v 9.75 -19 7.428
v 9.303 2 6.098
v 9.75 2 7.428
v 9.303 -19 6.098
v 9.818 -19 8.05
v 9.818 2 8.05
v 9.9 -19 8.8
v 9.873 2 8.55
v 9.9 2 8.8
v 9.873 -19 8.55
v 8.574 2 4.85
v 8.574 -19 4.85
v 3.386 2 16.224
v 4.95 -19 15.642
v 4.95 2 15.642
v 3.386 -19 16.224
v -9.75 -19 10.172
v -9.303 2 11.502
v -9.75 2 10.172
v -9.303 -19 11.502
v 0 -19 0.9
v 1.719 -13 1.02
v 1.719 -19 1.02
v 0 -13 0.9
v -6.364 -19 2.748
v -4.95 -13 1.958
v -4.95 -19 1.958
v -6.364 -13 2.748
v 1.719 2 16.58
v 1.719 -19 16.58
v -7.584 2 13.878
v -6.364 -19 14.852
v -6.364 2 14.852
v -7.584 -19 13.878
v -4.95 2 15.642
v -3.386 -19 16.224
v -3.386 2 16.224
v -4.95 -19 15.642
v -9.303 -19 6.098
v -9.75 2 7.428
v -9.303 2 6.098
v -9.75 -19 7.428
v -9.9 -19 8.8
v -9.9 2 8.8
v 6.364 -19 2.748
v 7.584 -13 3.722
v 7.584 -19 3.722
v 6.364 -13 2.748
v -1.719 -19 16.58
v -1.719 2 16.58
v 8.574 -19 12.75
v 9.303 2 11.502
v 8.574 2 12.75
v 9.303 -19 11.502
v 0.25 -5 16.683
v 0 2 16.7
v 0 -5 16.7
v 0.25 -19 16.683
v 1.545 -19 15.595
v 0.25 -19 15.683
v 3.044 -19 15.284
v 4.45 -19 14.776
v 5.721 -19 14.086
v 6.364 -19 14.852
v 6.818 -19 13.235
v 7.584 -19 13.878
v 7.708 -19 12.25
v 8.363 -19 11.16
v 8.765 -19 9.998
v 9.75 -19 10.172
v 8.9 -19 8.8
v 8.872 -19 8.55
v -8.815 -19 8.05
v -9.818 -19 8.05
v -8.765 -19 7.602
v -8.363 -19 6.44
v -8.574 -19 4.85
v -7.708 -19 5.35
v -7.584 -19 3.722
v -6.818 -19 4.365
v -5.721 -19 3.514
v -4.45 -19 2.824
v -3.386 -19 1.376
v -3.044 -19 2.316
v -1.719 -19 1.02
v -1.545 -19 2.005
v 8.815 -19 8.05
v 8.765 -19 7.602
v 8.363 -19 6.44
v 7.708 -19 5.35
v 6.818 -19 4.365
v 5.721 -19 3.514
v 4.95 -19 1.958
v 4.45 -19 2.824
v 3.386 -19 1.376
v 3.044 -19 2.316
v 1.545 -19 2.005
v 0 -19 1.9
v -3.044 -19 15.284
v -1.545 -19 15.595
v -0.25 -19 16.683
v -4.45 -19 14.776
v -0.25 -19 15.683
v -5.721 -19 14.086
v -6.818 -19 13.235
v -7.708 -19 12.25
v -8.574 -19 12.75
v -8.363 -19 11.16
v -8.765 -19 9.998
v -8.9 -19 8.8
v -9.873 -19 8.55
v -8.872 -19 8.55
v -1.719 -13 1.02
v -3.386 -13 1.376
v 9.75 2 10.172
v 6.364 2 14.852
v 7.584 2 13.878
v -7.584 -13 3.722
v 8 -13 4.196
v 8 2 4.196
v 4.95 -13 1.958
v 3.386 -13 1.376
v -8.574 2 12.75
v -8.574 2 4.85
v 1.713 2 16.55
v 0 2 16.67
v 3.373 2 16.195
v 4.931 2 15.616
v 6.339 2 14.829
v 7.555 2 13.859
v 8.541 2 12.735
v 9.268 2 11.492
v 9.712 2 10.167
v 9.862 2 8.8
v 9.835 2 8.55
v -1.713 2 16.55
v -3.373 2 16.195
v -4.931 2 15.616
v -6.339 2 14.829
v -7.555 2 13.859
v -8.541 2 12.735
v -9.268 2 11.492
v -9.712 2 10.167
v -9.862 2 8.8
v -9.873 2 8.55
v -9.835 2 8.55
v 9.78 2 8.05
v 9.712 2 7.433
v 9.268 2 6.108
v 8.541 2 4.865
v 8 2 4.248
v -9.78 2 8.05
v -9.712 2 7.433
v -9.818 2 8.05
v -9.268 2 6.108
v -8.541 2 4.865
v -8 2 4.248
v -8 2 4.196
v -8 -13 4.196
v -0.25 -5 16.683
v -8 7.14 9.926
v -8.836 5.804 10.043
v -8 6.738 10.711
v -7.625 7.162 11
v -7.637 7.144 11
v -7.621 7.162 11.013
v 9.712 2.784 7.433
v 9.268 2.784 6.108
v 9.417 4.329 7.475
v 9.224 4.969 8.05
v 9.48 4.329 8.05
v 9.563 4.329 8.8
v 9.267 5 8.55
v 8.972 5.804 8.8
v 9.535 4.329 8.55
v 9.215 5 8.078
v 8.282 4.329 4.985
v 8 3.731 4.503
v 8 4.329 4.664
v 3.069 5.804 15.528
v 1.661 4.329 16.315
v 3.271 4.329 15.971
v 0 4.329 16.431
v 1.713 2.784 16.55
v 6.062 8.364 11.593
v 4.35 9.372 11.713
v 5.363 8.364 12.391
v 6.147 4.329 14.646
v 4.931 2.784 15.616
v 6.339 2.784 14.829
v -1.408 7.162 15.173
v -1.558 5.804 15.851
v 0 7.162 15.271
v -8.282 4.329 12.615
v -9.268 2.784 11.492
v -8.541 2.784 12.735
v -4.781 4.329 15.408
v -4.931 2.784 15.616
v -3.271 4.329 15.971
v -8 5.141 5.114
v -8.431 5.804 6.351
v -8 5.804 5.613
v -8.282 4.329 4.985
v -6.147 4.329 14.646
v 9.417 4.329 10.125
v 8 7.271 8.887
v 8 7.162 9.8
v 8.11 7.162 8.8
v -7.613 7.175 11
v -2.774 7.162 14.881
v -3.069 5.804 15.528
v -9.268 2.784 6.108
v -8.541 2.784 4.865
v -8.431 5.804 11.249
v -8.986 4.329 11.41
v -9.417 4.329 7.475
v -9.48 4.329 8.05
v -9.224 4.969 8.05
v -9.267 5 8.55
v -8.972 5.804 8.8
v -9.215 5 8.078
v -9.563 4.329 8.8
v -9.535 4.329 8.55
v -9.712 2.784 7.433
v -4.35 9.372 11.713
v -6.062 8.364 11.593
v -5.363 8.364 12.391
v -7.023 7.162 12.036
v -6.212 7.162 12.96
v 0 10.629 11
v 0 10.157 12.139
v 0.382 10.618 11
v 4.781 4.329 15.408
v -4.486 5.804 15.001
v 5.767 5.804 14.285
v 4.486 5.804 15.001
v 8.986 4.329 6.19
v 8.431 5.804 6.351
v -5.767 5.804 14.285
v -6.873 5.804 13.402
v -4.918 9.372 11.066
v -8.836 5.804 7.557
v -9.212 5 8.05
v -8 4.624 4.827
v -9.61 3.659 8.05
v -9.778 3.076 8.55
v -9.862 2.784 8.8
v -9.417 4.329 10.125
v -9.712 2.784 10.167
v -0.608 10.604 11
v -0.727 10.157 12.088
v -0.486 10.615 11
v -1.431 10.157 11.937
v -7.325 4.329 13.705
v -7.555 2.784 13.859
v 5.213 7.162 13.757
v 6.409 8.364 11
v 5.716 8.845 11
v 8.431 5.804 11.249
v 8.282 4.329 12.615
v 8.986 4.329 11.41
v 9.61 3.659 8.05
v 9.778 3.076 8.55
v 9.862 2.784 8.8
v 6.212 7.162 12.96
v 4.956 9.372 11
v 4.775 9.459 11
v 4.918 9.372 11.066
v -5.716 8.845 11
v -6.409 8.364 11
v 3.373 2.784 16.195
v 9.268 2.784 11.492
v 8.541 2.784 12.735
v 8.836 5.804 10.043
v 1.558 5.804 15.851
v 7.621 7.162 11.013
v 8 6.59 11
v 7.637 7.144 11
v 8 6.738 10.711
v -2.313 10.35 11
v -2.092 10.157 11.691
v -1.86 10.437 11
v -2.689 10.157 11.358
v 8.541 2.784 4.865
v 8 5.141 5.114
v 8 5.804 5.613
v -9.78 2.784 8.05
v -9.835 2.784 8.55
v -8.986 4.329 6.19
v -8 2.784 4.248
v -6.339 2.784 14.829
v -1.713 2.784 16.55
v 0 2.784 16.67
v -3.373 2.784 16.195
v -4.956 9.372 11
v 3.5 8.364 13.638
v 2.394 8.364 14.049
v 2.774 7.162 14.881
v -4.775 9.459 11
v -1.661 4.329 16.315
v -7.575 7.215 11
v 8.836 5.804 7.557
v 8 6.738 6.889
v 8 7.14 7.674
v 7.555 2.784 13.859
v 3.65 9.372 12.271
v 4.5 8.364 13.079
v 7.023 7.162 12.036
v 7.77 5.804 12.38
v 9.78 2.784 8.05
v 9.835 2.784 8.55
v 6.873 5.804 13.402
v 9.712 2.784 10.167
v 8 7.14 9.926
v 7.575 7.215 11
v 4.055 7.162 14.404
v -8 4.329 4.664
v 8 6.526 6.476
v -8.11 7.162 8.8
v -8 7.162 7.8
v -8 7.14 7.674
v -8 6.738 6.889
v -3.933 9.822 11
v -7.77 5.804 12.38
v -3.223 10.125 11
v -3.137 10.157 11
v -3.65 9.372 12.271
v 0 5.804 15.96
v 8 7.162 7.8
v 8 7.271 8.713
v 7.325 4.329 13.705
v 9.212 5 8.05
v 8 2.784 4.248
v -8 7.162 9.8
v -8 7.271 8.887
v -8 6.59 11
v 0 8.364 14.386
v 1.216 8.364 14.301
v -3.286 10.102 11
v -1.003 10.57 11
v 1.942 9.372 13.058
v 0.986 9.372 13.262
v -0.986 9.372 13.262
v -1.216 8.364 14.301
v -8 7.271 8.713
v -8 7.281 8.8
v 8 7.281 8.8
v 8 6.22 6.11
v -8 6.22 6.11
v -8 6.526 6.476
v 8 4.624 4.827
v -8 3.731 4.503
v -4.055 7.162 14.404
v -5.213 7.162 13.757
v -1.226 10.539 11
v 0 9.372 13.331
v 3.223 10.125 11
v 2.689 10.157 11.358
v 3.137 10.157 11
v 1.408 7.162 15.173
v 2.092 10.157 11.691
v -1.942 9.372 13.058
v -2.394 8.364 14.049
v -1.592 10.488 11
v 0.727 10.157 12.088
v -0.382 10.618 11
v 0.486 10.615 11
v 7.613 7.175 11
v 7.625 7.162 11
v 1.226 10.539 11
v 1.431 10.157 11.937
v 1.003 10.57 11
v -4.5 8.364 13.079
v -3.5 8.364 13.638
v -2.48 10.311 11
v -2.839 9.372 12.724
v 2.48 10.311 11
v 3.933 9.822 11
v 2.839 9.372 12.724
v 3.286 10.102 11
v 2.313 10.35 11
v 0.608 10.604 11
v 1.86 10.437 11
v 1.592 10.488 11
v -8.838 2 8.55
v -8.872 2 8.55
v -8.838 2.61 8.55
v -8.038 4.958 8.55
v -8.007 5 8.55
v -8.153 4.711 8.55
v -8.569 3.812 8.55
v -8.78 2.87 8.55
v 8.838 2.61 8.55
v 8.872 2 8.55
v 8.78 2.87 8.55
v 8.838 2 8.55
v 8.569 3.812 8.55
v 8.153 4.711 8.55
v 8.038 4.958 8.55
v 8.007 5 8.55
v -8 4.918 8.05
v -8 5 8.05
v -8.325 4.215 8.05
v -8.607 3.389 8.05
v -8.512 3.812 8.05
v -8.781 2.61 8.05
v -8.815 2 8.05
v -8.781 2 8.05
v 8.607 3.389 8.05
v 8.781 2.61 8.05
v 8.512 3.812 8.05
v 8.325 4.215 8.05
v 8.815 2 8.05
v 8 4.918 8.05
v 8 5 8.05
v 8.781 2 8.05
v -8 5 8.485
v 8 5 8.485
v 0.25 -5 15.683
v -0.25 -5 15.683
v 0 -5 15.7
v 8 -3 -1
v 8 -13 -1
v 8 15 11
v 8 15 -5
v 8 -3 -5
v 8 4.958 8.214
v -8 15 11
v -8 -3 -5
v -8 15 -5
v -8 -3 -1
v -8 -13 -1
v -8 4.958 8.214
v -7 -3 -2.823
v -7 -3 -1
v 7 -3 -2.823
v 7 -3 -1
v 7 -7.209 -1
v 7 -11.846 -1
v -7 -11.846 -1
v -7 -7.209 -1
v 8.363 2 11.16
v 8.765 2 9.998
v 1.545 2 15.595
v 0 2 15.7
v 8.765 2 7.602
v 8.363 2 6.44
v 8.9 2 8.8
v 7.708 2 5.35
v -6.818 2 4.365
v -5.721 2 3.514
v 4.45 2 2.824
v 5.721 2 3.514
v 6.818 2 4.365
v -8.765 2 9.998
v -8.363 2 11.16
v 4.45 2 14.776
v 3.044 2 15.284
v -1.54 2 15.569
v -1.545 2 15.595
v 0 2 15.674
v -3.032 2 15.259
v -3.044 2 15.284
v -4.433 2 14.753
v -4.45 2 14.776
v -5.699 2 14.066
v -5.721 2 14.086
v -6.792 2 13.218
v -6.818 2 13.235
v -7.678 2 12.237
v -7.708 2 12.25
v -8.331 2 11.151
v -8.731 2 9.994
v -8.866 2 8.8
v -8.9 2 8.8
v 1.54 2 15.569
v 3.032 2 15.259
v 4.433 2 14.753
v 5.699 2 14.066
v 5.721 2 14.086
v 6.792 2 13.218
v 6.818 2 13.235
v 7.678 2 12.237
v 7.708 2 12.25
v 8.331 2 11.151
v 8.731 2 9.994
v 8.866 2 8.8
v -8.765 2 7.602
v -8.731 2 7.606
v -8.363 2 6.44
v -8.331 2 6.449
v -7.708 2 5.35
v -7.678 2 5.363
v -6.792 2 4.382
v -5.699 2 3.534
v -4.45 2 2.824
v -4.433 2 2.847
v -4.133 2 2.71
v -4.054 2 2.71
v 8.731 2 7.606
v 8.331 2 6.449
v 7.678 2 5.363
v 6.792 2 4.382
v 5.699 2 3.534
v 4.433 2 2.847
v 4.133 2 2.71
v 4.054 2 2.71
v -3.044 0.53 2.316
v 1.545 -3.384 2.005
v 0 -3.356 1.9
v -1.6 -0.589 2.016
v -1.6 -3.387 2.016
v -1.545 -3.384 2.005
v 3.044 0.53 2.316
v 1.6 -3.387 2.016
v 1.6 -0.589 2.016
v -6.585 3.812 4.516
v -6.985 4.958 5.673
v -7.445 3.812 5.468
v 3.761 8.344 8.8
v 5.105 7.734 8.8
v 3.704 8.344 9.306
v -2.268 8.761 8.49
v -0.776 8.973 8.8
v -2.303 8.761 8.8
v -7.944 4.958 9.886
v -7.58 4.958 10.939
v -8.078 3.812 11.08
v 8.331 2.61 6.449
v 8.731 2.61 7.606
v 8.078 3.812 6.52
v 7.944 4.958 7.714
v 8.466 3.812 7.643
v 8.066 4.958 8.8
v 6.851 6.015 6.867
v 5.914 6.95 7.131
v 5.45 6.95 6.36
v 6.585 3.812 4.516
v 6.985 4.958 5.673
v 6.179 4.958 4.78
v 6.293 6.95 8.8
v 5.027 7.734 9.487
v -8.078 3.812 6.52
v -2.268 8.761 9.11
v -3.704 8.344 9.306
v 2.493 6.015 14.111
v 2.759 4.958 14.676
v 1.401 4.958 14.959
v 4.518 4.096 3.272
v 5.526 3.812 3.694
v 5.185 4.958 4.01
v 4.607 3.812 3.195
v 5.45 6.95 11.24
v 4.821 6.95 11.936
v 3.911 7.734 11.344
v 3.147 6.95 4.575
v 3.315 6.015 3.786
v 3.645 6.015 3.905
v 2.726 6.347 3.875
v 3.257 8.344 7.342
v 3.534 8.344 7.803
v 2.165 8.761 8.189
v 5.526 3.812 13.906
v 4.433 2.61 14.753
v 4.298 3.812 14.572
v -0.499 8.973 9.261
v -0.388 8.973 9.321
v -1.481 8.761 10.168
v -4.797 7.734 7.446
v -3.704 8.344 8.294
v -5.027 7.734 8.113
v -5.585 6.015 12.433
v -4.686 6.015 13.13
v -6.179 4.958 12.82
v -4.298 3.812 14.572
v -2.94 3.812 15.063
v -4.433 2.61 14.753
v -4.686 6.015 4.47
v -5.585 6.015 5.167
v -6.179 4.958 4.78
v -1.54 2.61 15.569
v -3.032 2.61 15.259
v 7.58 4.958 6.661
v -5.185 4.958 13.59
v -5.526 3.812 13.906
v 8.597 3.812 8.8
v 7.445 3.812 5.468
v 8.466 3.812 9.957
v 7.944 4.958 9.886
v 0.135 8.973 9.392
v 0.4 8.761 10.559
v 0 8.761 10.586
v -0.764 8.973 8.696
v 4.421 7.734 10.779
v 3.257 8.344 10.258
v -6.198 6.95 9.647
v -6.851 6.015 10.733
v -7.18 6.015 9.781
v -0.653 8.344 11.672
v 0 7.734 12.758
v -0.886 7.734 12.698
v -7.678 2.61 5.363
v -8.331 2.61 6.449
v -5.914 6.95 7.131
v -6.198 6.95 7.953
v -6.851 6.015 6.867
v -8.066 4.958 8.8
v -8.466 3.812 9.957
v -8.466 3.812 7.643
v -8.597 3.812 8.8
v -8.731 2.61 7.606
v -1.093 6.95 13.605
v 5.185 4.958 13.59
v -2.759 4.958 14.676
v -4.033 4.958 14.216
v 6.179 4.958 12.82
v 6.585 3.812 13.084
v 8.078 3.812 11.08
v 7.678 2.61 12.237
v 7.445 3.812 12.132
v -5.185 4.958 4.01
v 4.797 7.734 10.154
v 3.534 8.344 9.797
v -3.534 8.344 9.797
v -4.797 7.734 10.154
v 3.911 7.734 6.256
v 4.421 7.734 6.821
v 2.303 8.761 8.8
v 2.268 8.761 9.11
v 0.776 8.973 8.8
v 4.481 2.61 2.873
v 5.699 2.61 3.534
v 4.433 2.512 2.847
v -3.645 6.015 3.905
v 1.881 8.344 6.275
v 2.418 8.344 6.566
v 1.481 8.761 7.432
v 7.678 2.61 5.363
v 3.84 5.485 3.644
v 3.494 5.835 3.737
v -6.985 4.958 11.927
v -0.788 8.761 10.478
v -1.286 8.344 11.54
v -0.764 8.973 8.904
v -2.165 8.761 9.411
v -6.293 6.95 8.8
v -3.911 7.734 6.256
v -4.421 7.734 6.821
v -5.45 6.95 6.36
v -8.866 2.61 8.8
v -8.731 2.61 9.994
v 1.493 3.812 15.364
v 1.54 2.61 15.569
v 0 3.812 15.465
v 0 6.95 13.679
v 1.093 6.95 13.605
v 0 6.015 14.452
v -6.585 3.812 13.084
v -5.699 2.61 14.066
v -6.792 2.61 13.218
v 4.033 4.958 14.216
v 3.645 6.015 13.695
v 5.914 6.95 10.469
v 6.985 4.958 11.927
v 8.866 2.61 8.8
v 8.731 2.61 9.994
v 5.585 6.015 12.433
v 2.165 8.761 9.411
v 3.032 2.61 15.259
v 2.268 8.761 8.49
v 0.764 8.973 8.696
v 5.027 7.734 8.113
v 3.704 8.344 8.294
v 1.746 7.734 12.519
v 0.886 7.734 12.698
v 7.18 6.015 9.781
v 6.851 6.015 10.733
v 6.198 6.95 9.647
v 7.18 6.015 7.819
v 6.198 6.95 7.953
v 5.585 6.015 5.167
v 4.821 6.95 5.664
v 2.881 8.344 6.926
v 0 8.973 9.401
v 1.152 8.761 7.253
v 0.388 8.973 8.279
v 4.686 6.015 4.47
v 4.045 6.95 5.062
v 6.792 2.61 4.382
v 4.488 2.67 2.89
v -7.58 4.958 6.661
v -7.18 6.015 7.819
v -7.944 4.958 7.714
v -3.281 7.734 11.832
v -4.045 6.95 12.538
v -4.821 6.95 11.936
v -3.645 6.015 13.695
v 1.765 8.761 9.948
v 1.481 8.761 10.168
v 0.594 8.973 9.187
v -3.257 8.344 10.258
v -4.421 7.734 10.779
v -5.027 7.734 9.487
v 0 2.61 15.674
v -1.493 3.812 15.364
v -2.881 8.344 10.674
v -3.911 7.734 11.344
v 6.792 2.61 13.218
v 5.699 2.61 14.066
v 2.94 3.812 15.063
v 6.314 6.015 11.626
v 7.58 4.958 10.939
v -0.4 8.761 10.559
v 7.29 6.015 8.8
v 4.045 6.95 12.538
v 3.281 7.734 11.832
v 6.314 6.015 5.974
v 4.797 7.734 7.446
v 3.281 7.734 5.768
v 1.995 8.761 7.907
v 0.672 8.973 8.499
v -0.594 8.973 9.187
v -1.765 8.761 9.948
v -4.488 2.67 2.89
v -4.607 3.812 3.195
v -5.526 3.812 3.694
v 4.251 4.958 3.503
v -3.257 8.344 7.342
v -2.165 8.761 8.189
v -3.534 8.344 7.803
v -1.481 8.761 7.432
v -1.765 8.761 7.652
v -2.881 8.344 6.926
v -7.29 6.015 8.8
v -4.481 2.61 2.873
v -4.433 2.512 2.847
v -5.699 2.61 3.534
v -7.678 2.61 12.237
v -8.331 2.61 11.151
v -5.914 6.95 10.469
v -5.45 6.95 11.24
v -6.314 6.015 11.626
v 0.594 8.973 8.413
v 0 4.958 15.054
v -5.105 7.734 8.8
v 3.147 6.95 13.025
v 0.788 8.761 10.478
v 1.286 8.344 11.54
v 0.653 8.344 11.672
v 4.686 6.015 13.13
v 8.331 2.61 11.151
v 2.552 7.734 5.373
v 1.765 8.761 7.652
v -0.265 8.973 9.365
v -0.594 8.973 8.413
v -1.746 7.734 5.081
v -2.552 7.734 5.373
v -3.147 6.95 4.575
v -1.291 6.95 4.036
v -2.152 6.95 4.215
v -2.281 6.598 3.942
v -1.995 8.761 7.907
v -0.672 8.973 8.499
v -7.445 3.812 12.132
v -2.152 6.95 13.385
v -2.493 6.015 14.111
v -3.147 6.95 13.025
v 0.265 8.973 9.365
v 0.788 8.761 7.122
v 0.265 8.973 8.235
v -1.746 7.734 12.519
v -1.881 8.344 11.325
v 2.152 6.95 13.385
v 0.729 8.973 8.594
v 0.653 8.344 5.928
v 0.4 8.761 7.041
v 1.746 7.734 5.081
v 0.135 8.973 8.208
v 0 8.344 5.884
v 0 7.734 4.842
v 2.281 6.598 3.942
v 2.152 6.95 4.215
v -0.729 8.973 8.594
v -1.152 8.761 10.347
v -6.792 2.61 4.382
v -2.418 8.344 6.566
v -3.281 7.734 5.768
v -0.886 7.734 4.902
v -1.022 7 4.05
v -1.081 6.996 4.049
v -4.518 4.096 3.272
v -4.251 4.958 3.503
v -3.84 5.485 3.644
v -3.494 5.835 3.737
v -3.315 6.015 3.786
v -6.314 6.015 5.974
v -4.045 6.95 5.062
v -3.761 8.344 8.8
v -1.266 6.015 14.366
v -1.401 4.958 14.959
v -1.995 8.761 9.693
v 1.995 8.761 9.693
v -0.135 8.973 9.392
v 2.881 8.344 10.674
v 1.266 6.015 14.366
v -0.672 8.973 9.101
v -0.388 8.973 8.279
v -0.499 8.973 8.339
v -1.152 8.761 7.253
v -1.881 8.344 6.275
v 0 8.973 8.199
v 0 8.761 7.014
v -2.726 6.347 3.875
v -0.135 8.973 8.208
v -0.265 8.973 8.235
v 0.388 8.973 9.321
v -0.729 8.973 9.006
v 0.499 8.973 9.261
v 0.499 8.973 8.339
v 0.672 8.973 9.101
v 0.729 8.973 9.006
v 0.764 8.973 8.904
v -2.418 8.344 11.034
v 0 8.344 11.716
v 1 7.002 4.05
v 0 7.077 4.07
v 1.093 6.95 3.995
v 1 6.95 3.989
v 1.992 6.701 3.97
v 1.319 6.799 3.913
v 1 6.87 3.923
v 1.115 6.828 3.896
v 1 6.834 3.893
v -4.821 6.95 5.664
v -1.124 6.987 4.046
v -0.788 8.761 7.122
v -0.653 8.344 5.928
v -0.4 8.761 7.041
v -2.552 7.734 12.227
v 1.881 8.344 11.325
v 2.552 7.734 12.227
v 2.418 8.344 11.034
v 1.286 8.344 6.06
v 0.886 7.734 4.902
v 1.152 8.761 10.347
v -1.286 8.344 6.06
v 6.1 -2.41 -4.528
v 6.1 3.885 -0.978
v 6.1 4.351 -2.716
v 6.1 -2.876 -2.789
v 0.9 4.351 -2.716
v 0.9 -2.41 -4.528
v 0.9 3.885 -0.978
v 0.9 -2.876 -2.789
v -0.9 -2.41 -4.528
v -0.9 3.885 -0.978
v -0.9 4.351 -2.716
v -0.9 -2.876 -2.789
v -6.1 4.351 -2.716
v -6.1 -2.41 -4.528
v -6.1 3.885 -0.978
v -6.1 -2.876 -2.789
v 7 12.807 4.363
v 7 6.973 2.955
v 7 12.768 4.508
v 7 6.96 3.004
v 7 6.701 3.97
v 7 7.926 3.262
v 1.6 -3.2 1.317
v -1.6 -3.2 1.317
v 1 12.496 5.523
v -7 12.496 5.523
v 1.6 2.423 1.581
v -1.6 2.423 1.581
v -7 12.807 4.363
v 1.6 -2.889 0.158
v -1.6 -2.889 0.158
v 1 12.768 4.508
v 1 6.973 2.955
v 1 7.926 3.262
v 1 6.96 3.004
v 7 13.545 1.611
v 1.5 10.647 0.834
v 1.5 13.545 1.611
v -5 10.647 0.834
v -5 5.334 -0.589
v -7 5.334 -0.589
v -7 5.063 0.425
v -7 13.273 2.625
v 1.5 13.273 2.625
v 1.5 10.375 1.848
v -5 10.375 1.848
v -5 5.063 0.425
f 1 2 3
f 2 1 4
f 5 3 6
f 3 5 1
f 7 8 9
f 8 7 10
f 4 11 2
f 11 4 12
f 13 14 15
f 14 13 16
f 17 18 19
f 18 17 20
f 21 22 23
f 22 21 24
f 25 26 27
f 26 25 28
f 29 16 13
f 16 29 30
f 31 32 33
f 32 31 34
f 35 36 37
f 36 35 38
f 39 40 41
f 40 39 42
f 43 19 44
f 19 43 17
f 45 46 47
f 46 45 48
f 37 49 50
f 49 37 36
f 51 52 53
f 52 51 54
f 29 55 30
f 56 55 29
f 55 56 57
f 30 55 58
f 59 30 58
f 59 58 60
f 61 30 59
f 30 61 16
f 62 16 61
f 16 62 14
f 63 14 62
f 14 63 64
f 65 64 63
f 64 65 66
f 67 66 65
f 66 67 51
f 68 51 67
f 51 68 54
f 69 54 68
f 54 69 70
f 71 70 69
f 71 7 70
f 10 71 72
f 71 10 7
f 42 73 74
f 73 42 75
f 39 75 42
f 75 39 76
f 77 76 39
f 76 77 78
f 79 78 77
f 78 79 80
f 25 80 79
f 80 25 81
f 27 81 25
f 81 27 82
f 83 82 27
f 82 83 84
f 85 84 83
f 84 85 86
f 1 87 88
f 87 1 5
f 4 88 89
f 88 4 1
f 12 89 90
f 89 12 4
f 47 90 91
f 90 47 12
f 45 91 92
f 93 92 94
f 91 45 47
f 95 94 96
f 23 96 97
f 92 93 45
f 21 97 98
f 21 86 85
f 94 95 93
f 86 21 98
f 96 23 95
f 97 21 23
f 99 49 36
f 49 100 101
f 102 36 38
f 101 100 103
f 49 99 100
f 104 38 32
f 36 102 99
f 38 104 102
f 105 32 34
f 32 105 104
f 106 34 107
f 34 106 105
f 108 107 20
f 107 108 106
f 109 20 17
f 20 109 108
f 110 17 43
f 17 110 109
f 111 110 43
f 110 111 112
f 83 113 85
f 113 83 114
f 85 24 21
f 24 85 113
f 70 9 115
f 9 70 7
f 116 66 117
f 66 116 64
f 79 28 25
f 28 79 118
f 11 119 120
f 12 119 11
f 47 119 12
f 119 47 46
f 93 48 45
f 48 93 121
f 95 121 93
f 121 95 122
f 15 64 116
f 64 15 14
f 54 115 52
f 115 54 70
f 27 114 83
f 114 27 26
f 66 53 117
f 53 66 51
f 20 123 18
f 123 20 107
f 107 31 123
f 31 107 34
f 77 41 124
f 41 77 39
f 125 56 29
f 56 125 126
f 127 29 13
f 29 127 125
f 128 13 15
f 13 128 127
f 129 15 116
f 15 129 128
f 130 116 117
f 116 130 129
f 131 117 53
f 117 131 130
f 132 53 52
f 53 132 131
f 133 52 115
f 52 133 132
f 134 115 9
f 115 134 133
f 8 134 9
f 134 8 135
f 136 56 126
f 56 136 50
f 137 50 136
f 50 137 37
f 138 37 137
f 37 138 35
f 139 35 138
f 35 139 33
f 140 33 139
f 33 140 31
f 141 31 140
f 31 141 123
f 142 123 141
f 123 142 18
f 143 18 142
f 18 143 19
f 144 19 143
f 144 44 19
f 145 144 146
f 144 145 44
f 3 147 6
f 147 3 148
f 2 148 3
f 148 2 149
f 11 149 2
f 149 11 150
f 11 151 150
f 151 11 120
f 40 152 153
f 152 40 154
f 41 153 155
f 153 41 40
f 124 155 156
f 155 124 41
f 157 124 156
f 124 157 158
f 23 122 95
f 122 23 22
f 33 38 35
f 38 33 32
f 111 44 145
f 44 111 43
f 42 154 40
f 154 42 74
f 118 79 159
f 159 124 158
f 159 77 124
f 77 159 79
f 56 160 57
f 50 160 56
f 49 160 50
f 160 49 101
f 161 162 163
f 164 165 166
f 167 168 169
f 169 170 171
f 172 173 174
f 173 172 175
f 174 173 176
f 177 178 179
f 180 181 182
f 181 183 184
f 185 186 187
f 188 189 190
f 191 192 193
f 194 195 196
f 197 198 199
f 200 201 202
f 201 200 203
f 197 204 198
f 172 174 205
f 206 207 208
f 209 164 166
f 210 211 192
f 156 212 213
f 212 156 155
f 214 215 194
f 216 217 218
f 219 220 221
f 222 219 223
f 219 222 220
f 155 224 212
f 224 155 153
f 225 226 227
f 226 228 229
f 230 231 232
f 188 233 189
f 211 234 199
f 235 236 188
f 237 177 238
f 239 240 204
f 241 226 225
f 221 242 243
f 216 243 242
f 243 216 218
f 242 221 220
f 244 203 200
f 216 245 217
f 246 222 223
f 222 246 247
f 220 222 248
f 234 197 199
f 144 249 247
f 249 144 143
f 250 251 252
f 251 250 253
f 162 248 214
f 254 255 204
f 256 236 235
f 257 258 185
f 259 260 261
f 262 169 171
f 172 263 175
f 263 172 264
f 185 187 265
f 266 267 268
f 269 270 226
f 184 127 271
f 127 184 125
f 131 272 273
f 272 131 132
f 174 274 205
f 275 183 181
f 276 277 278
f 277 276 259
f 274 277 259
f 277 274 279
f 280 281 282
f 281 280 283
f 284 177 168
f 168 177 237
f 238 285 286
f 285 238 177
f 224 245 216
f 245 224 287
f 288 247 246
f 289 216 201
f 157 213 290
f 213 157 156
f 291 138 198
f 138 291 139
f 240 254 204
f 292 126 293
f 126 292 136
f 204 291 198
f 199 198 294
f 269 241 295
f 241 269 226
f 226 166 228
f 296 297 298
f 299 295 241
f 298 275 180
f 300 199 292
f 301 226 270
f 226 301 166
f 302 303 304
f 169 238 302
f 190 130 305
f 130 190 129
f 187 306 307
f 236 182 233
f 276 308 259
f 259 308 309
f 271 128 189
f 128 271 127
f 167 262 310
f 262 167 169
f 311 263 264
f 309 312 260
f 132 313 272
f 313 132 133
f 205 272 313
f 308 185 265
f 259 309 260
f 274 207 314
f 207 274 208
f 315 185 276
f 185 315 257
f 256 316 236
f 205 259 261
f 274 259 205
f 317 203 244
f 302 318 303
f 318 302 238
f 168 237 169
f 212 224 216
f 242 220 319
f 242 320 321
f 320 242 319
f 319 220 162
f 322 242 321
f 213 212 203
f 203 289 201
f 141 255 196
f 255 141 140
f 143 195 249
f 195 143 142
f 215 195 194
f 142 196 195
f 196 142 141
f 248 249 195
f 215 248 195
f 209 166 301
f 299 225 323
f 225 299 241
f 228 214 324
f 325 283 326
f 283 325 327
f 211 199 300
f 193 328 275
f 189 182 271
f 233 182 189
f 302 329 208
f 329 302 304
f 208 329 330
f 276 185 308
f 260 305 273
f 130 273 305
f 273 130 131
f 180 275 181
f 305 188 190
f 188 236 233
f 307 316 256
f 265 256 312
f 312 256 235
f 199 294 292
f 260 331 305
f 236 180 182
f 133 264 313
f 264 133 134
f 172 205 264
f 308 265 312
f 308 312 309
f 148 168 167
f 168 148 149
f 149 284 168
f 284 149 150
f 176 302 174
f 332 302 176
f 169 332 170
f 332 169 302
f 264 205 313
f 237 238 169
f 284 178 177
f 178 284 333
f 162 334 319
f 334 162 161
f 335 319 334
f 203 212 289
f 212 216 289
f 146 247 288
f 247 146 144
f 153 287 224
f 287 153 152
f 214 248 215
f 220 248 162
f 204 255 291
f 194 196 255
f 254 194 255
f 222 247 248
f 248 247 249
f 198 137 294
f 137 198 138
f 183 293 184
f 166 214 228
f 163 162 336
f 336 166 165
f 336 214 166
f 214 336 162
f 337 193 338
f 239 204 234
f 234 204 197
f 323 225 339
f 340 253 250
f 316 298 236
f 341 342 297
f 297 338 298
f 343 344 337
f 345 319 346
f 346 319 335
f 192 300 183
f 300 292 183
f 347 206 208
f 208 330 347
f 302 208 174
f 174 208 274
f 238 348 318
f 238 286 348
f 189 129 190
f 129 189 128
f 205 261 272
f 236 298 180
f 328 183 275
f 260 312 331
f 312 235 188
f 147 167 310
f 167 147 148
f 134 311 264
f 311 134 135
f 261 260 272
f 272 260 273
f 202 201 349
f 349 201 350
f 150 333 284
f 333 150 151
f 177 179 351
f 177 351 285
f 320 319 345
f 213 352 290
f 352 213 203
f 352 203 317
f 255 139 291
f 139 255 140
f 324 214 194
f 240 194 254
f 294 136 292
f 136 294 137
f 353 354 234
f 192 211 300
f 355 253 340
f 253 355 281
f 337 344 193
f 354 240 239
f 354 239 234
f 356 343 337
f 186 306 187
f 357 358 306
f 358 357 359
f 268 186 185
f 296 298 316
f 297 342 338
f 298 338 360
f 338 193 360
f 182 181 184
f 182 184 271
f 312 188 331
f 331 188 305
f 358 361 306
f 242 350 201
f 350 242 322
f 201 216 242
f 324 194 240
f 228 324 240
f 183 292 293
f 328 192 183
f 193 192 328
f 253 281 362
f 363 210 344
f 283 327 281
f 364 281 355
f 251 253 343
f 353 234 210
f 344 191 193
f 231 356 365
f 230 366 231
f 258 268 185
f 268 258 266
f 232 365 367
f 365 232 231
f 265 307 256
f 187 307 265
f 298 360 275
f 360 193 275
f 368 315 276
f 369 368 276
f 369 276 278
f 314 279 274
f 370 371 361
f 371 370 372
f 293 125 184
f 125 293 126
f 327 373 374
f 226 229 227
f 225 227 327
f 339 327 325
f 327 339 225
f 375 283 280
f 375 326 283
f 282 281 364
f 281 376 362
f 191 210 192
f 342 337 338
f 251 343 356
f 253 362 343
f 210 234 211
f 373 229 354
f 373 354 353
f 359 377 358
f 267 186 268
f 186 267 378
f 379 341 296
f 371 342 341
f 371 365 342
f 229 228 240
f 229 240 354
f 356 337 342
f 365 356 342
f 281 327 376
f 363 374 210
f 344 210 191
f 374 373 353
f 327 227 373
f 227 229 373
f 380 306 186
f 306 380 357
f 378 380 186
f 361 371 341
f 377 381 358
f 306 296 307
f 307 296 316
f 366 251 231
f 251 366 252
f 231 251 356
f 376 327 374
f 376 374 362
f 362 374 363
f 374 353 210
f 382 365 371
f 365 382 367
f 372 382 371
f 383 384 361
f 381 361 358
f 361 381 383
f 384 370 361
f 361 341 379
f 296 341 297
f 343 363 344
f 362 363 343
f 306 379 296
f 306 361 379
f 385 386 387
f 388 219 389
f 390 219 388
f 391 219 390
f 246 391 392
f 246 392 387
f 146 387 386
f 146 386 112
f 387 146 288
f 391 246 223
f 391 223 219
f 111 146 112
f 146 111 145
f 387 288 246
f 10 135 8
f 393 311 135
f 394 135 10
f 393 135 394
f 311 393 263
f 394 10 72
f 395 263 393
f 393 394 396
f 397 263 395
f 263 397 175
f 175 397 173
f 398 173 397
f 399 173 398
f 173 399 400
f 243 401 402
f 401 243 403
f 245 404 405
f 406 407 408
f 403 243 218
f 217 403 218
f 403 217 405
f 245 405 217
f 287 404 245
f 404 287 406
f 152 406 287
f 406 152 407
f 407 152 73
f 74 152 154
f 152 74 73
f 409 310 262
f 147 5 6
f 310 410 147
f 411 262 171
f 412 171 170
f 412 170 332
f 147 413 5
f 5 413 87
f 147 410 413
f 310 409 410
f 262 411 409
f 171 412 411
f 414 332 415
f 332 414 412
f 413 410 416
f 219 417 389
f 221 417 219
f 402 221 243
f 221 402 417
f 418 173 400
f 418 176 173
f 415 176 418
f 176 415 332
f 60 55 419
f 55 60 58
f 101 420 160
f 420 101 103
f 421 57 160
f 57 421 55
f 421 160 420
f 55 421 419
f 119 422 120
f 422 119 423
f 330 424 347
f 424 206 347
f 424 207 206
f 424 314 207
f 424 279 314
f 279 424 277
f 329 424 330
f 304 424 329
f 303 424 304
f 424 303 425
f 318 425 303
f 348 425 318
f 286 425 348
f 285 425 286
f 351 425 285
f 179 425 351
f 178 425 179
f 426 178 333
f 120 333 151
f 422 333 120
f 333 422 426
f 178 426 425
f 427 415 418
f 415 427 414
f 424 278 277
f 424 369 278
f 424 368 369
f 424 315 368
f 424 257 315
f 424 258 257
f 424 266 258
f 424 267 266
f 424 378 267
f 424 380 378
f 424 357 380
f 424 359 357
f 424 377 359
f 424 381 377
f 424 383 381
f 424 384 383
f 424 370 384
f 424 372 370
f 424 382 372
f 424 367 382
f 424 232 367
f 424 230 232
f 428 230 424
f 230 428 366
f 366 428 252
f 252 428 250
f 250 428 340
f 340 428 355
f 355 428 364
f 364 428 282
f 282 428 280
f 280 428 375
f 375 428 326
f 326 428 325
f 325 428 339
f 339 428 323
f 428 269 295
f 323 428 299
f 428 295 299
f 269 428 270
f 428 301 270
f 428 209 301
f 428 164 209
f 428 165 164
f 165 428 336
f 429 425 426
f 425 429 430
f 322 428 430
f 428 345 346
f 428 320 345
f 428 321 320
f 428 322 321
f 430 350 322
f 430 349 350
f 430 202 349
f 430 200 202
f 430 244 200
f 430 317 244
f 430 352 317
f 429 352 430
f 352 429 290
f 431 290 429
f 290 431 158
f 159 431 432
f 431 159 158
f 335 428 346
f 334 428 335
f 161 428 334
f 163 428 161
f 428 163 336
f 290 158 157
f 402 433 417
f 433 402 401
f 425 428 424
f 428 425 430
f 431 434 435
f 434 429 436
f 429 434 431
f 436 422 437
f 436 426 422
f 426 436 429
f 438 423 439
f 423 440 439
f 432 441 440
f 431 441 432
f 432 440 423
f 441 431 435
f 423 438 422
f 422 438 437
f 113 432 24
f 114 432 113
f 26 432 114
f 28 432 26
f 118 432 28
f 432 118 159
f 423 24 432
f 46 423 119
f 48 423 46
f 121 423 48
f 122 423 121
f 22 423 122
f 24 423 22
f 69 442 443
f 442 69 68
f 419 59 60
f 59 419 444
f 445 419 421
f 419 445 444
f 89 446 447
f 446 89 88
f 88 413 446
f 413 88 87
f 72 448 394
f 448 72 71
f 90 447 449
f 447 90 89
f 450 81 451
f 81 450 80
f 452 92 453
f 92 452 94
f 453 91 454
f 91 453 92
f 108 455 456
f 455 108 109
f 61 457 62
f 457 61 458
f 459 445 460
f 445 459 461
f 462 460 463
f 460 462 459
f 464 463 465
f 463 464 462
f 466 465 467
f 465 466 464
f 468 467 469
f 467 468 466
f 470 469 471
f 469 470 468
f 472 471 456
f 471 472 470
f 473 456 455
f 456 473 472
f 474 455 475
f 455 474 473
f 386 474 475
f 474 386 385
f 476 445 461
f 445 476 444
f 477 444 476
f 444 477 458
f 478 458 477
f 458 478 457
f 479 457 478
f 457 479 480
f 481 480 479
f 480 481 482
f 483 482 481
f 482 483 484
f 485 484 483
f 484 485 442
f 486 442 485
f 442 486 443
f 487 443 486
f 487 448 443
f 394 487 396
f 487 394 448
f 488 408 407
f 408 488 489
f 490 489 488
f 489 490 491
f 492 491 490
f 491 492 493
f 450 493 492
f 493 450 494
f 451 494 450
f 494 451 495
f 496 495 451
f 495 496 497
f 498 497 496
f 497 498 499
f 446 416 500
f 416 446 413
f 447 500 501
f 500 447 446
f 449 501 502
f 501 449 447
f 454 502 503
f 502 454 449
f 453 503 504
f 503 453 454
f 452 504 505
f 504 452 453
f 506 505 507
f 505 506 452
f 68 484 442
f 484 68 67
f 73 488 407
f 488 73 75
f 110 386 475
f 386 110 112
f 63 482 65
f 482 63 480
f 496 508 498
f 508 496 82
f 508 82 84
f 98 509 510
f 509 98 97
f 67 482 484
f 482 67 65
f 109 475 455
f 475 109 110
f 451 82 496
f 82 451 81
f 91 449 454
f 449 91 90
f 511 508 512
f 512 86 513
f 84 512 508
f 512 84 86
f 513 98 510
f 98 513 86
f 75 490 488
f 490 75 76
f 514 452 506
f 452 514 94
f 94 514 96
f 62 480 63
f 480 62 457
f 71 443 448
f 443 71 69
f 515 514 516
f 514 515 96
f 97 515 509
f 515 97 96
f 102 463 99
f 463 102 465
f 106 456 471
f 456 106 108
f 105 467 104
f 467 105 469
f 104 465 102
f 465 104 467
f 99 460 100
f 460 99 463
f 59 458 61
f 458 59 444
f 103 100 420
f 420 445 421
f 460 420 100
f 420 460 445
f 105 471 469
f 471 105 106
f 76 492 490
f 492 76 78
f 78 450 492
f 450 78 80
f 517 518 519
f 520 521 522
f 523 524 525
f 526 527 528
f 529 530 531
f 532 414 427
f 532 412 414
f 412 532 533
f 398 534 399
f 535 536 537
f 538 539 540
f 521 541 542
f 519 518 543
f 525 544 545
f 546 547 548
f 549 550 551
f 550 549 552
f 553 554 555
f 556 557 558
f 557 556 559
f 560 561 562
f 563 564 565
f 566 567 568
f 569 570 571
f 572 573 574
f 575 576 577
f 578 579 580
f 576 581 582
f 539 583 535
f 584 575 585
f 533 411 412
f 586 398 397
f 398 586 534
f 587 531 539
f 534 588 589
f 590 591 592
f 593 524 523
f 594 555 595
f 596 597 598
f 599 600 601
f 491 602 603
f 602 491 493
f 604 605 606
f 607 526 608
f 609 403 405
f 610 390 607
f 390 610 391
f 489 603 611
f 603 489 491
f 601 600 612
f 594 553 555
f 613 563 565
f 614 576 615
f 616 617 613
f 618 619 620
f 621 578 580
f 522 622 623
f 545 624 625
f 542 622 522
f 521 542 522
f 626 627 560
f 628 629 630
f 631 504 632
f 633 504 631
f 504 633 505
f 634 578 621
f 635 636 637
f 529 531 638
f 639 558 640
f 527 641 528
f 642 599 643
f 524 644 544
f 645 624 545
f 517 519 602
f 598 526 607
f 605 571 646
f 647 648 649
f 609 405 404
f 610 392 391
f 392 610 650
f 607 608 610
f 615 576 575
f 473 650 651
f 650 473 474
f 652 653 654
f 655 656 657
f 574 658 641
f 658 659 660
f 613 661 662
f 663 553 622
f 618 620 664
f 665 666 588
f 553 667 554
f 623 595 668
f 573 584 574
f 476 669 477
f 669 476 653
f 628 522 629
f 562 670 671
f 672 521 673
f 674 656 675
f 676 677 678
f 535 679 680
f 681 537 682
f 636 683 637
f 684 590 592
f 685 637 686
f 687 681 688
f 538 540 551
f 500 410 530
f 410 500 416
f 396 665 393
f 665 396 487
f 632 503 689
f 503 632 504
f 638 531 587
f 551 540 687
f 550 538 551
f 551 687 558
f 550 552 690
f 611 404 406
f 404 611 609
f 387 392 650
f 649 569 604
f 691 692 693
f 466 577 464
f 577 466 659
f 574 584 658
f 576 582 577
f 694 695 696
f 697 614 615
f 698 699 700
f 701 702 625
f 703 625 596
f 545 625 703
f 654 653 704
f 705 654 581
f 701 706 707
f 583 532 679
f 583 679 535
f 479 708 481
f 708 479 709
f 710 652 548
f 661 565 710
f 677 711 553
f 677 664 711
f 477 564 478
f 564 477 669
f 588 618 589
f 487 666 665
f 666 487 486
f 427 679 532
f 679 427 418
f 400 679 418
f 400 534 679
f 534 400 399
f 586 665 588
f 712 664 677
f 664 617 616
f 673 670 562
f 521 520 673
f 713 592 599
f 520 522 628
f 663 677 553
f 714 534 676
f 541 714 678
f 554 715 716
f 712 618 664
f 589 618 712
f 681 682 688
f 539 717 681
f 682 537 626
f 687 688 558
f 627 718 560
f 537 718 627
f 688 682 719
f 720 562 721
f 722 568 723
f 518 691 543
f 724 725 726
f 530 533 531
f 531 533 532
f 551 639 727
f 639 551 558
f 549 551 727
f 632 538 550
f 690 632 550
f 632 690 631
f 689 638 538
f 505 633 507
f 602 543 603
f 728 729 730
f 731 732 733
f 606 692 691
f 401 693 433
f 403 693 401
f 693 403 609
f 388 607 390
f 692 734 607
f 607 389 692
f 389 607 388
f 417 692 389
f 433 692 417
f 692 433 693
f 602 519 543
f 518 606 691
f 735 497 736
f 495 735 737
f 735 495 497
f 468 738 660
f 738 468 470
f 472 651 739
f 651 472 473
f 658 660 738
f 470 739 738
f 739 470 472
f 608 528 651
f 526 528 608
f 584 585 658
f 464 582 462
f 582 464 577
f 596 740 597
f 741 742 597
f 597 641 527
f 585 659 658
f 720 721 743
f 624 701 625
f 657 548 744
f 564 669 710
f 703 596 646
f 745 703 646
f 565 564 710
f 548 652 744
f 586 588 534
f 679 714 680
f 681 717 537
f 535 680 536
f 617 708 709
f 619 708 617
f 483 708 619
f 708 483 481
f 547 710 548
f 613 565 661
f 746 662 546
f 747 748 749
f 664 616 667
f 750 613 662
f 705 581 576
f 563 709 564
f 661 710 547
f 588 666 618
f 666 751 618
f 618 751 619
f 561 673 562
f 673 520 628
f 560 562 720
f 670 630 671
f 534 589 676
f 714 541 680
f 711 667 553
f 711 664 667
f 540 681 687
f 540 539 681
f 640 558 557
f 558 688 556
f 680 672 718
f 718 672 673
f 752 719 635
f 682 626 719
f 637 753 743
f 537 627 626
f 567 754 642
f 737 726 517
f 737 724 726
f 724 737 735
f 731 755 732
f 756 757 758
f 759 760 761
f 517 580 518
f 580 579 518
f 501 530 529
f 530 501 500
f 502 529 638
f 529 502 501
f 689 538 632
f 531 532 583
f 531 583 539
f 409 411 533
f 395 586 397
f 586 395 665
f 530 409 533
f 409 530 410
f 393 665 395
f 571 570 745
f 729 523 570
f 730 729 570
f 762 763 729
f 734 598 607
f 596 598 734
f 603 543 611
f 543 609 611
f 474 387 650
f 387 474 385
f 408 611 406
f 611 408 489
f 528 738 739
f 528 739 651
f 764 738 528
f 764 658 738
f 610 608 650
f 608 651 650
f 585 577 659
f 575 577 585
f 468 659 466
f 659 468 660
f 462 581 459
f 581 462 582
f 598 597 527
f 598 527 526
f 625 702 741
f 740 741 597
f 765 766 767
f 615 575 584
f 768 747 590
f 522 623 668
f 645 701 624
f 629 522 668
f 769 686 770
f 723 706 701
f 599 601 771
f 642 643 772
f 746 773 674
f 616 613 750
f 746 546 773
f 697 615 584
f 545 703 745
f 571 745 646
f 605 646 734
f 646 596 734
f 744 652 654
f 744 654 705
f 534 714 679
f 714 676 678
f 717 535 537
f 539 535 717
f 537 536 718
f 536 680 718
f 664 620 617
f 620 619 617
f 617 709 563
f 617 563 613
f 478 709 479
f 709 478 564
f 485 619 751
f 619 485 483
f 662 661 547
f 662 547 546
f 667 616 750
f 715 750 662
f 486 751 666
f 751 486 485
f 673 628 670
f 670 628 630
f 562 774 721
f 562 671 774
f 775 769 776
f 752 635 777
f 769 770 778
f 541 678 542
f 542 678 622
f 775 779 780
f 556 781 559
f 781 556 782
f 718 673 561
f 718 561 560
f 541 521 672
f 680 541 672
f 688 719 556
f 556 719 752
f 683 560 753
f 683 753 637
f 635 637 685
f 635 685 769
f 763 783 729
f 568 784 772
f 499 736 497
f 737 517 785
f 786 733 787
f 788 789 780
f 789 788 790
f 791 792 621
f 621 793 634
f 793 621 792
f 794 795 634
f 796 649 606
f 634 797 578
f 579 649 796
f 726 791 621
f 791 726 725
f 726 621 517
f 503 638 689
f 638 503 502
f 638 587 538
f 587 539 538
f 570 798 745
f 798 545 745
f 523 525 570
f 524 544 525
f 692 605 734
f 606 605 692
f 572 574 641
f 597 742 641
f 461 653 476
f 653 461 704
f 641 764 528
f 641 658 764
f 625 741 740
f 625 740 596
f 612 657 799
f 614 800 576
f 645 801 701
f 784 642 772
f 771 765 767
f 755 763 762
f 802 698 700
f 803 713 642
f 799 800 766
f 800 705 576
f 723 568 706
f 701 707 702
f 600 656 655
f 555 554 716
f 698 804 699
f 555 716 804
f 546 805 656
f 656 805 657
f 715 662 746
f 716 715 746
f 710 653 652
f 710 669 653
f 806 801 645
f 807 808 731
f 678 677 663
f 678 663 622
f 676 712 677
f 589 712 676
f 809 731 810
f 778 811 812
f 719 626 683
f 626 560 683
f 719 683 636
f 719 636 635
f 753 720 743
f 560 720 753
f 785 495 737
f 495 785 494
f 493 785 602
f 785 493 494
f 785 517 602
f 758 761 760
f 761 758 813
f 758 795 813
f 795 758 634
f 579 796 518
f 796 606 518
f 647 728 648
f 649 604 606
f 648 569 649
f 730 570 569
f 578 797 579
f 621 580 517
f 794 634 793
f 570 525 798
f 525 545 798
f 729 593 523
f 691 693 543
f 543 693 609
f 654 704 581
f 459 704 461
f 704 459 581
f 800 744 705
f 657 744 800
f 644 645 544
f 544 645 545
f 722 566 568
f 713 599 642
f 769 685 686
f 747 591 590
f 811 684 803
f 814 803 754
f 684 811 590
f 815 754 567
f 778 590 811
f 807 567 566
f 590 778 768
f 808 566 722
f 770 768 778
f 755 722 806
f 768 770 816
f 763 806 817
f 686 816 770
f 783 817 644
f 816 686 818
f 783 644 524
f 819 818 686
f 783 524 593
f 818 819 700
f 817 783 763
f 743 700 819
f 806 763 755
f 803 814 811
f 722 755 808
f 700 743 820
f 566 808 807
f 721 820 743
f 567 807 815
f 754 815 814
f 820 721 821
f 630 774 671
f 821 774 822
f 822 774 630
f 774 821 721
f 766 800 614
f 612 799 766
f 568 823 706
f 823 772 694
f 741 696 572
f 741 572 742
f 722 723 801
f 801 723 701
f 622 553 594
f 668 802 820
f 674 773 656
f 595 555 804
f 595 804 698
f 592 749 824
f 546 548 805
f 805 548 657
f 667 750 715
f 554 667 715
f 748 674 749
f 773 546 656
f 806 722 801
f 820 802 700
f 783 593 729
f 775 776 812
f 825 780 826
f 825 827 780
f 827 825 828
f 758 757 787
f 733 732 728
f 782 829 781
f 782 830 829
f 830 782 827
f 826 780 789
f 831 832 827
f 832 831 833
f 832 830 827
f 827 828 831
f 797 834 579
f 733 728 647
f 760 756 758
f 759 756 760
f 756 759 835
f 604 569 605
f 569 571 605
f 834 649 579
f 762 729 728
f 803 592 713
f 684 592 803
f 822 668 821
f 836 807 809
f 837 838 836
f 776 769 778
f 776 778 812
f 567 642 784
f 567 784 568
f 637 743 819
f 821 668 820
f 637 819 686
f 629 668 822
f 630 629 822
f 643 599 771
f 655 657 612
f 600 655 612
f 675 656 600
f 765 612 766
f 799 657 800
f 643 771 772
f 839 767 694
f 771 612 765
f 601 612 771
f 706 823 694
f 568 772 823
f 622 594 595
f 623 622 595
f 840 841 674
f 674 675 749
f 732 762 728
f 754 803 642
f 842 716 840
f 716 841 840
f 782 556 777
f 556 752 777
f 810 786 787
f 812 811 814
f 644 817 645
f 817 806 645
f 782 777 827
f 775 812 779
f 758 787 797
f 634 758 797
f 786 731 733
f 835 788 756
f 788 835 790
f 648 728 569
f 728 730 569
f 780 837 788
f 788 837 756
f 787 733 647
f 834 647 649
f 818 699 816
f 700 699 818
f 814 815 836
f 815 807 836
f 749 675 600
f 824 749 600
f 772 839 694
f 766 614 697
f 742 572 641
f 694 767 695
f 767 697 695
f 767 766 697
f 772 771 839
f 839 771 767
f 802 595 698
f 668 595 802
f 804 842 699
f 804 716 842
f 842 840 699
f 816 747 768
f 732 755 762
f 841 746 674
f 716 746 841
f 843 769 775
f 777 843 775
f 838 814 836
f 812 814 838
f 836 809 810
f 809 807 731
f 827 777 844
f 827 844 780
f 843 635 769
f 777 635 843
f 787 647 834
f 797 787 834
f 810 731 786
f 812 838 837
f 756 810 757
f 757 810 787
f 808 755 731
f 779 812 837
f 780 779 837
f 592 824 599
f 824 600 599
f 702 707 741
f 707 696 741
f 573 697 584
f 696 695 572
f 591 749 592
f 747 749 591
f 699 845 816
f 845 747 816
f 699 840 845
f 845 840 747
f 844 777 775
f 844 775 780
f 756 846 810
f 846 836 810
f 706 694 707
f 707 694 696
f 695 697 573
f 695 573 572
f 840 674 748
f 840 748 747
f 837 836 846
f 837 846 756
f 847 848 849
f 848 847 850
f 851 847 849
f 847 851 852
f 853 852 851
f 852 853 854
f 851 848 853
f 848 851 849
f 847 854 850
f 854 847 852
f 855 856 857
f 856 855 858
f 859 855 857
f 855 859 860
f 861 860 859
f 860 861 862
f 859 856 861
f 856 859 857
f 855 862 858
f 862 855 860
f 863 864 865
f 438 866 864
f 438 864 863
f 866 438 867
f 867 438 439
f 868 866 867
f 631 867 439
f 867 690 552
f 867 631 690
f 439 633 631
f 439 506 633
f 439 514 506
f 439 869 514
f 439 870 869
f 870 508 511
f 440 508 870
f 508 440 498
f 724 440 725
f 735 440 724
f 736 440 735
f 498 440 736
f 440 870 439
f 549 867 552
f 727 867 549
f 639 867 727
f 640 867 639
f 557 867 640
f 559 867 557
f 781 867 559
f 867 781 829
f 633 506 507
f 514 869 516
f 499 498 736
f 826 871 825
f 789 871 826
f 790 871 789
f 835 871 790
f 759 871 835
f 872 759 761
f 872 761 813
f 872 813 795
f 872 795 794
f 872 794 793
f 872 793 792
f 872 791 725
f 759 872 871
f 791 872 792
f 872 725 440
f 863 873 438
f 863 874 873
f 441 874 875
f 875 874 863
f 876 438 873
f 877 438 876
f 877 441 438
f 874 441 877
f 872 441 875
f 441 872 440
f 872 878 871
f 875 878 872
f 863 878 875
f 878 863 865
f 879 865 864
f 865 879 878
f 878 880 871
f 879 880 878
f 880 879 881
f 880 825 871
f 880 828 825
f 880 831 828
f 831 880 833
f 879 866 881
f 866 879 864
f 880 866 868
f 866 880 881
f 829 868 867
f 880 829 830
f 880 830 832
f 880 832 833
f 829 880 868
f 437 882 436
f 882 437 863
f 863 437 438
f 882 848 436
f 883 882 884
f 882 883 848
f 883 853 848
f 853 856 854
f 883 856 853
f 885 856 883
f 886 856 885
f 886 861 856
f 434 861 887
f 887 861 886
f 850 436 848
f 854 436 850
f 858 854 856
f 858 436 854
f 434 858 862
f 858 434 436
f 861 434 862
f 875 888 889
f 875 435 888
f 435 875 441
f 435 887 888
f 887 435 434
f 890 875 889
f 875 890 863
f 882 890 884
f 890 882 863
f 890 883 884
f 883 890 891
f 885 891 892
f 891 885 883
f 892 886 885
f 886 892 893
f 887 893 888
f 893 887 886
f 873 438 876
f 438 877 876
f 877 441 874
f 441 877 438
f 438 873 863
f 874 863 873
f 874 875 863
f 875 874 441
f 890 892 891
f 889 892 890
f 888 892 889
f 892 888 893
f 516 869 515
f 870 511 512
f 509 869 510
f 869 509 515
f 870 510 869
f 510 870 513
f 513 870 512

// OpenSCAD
// Pulse Oximeter finger-clip
// V9

// Units are mm

module prism(l, w, h){
   polyhedron(
           points=[[0,0,0], [l,0,0], [l,w,0], [0,w,0], [0,w,h], [l,w,h]],
           faces=[[0,1,2,3],[5,4,3,2],[0,4,5,1],[0,3,4],[5,2,1]]
           );
}

// _______ Finger _______
// elliptic cylinder with rounded top
module elrdcyl(
   w, // width of finger
   d, // thickness of finger
   h1,// straight height of cylinder
   h2 // height of rounded top
   ) {
   intersection(){
     union(){
       scale([w/2,d/2,1])cylinder(r=1,h=h1,$fn=36);  // cylinder
       translate([0,0,h1])scale([w/2,d/2,h2])sphere(r=1,$fn=36);  // top
     }
     scale([w/2,d/2,1])cylinder(r=1,h=h1+h2,$fn=36); // only needed if h2>h1 
   }
}

fingerHeight = 17.8;
fingerWidth = 13.8;
module drawFinger() {
    translate([0, -(26-9), 8.8]) {
        rotate([-90, 0, 0]) {
            elrdcyl(fingerHeight,fingerWidth,19,7);
        }
    }
    translate([0, -(28-9), 8.8]) {
        rotate([-90, 0, 0]) {
            elrdcyl(fingerHeight,fingerWidth,5,0);
        }
    }
}

// _______ Finger Clip _______
module drawClip(thickness) {
    // Cylindrical part
    difference () {
        translate([0, -(thickness + 26-9), 8.8]) {
            rotate([-90, 0, 0]) {
                elrdcyl(fingerHeight + thickness, fingerWidth + thickness, 19 + thickness, 7 + thickness);
            }
        }
        // Slits, for flexibility
        translate([0, -10, 8.3]) {
            cube([30, 30, 0.5], center=true);
        }
        translate([0, -20, fingerHeight]) {
            cube([0.5, 30, 15], center=true);
        }
    }
    // Over the pulse oximeter part
    translate([0, 6, 3]) {
        cube([16, 18, 16], center=true);
    }
    // Make the bottom flat and add a bit to help hold the pulseox
    translate([0, 0, 2]) {
        cube([16, 26, 6], center=true);
    }
}

// _______ The Pulse Oximeter _______
module drawPulseOximeter() {
    color( c = [1.0, 0, 0, 0.75] ) {
        length = 27;
        width = 14;
        thickness = 1.8;
        // PCB
        cube([width, length, thickness], center=true);
        // Components
        // Sensor
        translate([0, 0, thickness]) {
            cube([3.2, 5.5, thickness], center=true);
        }
        translate([0, 0, 3]) {  // To make the sensor taller
            cube([3.2, 5.5, thickness], center=true);
        }
        // Connectors
        translate([0, 0, -(1.5/2+3/2)]) {
            translate([12/2 - 5/2, 0, 0]) {
                cube([5.2, 7, 3], center=true);
            }
            translate([-12/2 + 5/2, 0, 0]) {
                cube([5.2, 7, 3], center=true);
            }
        }
        // Top
        translate([0, 0, thickness/2+1.2/2]) {
            // Parts on top, notch where there aren't any
            difference() {
                cube([width, length, 1.2], center=true);
                translate([width/2-6/2, length/2-6/2, 0.1]){
                    cube([6, 6, 1.1], center=true);
                }
                /* Empty space on board near back
                translate([-width/2+9.5/2, -length/2+6.5/2]){
                    cube([9.5, 6.5, 1.2], center=true);
                }*/
            }
            // Chamfer the notch
            translate([0, length/2-5, -0.4]) {
                prism(width/2, -1, 1);
            }
        }
        // Bottom
        translate([0, 0, -1.5/2-1.2/2]) {
            difference() {
                cube([width, length, 1.2], center=true);
                translate([-width/2+8.5/2, length/2-3/2]){
                    cube([8.5, 3, 1.2], center=true);
                }
                translate([-width/2+2/2, length/2-8.5/2]){
                    cube([2, 8.5, 1.2], center=true);
                }
            }
        }
        // Wires
        translate([0, -length/2+3/2, -thickness/2 - 10/2]){
            cube([width, 3, 10], center=true);
        }
        translate([width/2 - 2.5/2, -length/2+8.5/2, -thickness/2 - 10/2]){
            cube([2.5, 8.5, 10], center=true);
        }
    }
}

// Draw all of the parts
//drawPulseOximeter();

difference() {
    drawClip(2);
    union() {
        drawFinger();
        rotate([15, 0, 0]) { 
            drawPulseOximeter();
        }
    }
}
